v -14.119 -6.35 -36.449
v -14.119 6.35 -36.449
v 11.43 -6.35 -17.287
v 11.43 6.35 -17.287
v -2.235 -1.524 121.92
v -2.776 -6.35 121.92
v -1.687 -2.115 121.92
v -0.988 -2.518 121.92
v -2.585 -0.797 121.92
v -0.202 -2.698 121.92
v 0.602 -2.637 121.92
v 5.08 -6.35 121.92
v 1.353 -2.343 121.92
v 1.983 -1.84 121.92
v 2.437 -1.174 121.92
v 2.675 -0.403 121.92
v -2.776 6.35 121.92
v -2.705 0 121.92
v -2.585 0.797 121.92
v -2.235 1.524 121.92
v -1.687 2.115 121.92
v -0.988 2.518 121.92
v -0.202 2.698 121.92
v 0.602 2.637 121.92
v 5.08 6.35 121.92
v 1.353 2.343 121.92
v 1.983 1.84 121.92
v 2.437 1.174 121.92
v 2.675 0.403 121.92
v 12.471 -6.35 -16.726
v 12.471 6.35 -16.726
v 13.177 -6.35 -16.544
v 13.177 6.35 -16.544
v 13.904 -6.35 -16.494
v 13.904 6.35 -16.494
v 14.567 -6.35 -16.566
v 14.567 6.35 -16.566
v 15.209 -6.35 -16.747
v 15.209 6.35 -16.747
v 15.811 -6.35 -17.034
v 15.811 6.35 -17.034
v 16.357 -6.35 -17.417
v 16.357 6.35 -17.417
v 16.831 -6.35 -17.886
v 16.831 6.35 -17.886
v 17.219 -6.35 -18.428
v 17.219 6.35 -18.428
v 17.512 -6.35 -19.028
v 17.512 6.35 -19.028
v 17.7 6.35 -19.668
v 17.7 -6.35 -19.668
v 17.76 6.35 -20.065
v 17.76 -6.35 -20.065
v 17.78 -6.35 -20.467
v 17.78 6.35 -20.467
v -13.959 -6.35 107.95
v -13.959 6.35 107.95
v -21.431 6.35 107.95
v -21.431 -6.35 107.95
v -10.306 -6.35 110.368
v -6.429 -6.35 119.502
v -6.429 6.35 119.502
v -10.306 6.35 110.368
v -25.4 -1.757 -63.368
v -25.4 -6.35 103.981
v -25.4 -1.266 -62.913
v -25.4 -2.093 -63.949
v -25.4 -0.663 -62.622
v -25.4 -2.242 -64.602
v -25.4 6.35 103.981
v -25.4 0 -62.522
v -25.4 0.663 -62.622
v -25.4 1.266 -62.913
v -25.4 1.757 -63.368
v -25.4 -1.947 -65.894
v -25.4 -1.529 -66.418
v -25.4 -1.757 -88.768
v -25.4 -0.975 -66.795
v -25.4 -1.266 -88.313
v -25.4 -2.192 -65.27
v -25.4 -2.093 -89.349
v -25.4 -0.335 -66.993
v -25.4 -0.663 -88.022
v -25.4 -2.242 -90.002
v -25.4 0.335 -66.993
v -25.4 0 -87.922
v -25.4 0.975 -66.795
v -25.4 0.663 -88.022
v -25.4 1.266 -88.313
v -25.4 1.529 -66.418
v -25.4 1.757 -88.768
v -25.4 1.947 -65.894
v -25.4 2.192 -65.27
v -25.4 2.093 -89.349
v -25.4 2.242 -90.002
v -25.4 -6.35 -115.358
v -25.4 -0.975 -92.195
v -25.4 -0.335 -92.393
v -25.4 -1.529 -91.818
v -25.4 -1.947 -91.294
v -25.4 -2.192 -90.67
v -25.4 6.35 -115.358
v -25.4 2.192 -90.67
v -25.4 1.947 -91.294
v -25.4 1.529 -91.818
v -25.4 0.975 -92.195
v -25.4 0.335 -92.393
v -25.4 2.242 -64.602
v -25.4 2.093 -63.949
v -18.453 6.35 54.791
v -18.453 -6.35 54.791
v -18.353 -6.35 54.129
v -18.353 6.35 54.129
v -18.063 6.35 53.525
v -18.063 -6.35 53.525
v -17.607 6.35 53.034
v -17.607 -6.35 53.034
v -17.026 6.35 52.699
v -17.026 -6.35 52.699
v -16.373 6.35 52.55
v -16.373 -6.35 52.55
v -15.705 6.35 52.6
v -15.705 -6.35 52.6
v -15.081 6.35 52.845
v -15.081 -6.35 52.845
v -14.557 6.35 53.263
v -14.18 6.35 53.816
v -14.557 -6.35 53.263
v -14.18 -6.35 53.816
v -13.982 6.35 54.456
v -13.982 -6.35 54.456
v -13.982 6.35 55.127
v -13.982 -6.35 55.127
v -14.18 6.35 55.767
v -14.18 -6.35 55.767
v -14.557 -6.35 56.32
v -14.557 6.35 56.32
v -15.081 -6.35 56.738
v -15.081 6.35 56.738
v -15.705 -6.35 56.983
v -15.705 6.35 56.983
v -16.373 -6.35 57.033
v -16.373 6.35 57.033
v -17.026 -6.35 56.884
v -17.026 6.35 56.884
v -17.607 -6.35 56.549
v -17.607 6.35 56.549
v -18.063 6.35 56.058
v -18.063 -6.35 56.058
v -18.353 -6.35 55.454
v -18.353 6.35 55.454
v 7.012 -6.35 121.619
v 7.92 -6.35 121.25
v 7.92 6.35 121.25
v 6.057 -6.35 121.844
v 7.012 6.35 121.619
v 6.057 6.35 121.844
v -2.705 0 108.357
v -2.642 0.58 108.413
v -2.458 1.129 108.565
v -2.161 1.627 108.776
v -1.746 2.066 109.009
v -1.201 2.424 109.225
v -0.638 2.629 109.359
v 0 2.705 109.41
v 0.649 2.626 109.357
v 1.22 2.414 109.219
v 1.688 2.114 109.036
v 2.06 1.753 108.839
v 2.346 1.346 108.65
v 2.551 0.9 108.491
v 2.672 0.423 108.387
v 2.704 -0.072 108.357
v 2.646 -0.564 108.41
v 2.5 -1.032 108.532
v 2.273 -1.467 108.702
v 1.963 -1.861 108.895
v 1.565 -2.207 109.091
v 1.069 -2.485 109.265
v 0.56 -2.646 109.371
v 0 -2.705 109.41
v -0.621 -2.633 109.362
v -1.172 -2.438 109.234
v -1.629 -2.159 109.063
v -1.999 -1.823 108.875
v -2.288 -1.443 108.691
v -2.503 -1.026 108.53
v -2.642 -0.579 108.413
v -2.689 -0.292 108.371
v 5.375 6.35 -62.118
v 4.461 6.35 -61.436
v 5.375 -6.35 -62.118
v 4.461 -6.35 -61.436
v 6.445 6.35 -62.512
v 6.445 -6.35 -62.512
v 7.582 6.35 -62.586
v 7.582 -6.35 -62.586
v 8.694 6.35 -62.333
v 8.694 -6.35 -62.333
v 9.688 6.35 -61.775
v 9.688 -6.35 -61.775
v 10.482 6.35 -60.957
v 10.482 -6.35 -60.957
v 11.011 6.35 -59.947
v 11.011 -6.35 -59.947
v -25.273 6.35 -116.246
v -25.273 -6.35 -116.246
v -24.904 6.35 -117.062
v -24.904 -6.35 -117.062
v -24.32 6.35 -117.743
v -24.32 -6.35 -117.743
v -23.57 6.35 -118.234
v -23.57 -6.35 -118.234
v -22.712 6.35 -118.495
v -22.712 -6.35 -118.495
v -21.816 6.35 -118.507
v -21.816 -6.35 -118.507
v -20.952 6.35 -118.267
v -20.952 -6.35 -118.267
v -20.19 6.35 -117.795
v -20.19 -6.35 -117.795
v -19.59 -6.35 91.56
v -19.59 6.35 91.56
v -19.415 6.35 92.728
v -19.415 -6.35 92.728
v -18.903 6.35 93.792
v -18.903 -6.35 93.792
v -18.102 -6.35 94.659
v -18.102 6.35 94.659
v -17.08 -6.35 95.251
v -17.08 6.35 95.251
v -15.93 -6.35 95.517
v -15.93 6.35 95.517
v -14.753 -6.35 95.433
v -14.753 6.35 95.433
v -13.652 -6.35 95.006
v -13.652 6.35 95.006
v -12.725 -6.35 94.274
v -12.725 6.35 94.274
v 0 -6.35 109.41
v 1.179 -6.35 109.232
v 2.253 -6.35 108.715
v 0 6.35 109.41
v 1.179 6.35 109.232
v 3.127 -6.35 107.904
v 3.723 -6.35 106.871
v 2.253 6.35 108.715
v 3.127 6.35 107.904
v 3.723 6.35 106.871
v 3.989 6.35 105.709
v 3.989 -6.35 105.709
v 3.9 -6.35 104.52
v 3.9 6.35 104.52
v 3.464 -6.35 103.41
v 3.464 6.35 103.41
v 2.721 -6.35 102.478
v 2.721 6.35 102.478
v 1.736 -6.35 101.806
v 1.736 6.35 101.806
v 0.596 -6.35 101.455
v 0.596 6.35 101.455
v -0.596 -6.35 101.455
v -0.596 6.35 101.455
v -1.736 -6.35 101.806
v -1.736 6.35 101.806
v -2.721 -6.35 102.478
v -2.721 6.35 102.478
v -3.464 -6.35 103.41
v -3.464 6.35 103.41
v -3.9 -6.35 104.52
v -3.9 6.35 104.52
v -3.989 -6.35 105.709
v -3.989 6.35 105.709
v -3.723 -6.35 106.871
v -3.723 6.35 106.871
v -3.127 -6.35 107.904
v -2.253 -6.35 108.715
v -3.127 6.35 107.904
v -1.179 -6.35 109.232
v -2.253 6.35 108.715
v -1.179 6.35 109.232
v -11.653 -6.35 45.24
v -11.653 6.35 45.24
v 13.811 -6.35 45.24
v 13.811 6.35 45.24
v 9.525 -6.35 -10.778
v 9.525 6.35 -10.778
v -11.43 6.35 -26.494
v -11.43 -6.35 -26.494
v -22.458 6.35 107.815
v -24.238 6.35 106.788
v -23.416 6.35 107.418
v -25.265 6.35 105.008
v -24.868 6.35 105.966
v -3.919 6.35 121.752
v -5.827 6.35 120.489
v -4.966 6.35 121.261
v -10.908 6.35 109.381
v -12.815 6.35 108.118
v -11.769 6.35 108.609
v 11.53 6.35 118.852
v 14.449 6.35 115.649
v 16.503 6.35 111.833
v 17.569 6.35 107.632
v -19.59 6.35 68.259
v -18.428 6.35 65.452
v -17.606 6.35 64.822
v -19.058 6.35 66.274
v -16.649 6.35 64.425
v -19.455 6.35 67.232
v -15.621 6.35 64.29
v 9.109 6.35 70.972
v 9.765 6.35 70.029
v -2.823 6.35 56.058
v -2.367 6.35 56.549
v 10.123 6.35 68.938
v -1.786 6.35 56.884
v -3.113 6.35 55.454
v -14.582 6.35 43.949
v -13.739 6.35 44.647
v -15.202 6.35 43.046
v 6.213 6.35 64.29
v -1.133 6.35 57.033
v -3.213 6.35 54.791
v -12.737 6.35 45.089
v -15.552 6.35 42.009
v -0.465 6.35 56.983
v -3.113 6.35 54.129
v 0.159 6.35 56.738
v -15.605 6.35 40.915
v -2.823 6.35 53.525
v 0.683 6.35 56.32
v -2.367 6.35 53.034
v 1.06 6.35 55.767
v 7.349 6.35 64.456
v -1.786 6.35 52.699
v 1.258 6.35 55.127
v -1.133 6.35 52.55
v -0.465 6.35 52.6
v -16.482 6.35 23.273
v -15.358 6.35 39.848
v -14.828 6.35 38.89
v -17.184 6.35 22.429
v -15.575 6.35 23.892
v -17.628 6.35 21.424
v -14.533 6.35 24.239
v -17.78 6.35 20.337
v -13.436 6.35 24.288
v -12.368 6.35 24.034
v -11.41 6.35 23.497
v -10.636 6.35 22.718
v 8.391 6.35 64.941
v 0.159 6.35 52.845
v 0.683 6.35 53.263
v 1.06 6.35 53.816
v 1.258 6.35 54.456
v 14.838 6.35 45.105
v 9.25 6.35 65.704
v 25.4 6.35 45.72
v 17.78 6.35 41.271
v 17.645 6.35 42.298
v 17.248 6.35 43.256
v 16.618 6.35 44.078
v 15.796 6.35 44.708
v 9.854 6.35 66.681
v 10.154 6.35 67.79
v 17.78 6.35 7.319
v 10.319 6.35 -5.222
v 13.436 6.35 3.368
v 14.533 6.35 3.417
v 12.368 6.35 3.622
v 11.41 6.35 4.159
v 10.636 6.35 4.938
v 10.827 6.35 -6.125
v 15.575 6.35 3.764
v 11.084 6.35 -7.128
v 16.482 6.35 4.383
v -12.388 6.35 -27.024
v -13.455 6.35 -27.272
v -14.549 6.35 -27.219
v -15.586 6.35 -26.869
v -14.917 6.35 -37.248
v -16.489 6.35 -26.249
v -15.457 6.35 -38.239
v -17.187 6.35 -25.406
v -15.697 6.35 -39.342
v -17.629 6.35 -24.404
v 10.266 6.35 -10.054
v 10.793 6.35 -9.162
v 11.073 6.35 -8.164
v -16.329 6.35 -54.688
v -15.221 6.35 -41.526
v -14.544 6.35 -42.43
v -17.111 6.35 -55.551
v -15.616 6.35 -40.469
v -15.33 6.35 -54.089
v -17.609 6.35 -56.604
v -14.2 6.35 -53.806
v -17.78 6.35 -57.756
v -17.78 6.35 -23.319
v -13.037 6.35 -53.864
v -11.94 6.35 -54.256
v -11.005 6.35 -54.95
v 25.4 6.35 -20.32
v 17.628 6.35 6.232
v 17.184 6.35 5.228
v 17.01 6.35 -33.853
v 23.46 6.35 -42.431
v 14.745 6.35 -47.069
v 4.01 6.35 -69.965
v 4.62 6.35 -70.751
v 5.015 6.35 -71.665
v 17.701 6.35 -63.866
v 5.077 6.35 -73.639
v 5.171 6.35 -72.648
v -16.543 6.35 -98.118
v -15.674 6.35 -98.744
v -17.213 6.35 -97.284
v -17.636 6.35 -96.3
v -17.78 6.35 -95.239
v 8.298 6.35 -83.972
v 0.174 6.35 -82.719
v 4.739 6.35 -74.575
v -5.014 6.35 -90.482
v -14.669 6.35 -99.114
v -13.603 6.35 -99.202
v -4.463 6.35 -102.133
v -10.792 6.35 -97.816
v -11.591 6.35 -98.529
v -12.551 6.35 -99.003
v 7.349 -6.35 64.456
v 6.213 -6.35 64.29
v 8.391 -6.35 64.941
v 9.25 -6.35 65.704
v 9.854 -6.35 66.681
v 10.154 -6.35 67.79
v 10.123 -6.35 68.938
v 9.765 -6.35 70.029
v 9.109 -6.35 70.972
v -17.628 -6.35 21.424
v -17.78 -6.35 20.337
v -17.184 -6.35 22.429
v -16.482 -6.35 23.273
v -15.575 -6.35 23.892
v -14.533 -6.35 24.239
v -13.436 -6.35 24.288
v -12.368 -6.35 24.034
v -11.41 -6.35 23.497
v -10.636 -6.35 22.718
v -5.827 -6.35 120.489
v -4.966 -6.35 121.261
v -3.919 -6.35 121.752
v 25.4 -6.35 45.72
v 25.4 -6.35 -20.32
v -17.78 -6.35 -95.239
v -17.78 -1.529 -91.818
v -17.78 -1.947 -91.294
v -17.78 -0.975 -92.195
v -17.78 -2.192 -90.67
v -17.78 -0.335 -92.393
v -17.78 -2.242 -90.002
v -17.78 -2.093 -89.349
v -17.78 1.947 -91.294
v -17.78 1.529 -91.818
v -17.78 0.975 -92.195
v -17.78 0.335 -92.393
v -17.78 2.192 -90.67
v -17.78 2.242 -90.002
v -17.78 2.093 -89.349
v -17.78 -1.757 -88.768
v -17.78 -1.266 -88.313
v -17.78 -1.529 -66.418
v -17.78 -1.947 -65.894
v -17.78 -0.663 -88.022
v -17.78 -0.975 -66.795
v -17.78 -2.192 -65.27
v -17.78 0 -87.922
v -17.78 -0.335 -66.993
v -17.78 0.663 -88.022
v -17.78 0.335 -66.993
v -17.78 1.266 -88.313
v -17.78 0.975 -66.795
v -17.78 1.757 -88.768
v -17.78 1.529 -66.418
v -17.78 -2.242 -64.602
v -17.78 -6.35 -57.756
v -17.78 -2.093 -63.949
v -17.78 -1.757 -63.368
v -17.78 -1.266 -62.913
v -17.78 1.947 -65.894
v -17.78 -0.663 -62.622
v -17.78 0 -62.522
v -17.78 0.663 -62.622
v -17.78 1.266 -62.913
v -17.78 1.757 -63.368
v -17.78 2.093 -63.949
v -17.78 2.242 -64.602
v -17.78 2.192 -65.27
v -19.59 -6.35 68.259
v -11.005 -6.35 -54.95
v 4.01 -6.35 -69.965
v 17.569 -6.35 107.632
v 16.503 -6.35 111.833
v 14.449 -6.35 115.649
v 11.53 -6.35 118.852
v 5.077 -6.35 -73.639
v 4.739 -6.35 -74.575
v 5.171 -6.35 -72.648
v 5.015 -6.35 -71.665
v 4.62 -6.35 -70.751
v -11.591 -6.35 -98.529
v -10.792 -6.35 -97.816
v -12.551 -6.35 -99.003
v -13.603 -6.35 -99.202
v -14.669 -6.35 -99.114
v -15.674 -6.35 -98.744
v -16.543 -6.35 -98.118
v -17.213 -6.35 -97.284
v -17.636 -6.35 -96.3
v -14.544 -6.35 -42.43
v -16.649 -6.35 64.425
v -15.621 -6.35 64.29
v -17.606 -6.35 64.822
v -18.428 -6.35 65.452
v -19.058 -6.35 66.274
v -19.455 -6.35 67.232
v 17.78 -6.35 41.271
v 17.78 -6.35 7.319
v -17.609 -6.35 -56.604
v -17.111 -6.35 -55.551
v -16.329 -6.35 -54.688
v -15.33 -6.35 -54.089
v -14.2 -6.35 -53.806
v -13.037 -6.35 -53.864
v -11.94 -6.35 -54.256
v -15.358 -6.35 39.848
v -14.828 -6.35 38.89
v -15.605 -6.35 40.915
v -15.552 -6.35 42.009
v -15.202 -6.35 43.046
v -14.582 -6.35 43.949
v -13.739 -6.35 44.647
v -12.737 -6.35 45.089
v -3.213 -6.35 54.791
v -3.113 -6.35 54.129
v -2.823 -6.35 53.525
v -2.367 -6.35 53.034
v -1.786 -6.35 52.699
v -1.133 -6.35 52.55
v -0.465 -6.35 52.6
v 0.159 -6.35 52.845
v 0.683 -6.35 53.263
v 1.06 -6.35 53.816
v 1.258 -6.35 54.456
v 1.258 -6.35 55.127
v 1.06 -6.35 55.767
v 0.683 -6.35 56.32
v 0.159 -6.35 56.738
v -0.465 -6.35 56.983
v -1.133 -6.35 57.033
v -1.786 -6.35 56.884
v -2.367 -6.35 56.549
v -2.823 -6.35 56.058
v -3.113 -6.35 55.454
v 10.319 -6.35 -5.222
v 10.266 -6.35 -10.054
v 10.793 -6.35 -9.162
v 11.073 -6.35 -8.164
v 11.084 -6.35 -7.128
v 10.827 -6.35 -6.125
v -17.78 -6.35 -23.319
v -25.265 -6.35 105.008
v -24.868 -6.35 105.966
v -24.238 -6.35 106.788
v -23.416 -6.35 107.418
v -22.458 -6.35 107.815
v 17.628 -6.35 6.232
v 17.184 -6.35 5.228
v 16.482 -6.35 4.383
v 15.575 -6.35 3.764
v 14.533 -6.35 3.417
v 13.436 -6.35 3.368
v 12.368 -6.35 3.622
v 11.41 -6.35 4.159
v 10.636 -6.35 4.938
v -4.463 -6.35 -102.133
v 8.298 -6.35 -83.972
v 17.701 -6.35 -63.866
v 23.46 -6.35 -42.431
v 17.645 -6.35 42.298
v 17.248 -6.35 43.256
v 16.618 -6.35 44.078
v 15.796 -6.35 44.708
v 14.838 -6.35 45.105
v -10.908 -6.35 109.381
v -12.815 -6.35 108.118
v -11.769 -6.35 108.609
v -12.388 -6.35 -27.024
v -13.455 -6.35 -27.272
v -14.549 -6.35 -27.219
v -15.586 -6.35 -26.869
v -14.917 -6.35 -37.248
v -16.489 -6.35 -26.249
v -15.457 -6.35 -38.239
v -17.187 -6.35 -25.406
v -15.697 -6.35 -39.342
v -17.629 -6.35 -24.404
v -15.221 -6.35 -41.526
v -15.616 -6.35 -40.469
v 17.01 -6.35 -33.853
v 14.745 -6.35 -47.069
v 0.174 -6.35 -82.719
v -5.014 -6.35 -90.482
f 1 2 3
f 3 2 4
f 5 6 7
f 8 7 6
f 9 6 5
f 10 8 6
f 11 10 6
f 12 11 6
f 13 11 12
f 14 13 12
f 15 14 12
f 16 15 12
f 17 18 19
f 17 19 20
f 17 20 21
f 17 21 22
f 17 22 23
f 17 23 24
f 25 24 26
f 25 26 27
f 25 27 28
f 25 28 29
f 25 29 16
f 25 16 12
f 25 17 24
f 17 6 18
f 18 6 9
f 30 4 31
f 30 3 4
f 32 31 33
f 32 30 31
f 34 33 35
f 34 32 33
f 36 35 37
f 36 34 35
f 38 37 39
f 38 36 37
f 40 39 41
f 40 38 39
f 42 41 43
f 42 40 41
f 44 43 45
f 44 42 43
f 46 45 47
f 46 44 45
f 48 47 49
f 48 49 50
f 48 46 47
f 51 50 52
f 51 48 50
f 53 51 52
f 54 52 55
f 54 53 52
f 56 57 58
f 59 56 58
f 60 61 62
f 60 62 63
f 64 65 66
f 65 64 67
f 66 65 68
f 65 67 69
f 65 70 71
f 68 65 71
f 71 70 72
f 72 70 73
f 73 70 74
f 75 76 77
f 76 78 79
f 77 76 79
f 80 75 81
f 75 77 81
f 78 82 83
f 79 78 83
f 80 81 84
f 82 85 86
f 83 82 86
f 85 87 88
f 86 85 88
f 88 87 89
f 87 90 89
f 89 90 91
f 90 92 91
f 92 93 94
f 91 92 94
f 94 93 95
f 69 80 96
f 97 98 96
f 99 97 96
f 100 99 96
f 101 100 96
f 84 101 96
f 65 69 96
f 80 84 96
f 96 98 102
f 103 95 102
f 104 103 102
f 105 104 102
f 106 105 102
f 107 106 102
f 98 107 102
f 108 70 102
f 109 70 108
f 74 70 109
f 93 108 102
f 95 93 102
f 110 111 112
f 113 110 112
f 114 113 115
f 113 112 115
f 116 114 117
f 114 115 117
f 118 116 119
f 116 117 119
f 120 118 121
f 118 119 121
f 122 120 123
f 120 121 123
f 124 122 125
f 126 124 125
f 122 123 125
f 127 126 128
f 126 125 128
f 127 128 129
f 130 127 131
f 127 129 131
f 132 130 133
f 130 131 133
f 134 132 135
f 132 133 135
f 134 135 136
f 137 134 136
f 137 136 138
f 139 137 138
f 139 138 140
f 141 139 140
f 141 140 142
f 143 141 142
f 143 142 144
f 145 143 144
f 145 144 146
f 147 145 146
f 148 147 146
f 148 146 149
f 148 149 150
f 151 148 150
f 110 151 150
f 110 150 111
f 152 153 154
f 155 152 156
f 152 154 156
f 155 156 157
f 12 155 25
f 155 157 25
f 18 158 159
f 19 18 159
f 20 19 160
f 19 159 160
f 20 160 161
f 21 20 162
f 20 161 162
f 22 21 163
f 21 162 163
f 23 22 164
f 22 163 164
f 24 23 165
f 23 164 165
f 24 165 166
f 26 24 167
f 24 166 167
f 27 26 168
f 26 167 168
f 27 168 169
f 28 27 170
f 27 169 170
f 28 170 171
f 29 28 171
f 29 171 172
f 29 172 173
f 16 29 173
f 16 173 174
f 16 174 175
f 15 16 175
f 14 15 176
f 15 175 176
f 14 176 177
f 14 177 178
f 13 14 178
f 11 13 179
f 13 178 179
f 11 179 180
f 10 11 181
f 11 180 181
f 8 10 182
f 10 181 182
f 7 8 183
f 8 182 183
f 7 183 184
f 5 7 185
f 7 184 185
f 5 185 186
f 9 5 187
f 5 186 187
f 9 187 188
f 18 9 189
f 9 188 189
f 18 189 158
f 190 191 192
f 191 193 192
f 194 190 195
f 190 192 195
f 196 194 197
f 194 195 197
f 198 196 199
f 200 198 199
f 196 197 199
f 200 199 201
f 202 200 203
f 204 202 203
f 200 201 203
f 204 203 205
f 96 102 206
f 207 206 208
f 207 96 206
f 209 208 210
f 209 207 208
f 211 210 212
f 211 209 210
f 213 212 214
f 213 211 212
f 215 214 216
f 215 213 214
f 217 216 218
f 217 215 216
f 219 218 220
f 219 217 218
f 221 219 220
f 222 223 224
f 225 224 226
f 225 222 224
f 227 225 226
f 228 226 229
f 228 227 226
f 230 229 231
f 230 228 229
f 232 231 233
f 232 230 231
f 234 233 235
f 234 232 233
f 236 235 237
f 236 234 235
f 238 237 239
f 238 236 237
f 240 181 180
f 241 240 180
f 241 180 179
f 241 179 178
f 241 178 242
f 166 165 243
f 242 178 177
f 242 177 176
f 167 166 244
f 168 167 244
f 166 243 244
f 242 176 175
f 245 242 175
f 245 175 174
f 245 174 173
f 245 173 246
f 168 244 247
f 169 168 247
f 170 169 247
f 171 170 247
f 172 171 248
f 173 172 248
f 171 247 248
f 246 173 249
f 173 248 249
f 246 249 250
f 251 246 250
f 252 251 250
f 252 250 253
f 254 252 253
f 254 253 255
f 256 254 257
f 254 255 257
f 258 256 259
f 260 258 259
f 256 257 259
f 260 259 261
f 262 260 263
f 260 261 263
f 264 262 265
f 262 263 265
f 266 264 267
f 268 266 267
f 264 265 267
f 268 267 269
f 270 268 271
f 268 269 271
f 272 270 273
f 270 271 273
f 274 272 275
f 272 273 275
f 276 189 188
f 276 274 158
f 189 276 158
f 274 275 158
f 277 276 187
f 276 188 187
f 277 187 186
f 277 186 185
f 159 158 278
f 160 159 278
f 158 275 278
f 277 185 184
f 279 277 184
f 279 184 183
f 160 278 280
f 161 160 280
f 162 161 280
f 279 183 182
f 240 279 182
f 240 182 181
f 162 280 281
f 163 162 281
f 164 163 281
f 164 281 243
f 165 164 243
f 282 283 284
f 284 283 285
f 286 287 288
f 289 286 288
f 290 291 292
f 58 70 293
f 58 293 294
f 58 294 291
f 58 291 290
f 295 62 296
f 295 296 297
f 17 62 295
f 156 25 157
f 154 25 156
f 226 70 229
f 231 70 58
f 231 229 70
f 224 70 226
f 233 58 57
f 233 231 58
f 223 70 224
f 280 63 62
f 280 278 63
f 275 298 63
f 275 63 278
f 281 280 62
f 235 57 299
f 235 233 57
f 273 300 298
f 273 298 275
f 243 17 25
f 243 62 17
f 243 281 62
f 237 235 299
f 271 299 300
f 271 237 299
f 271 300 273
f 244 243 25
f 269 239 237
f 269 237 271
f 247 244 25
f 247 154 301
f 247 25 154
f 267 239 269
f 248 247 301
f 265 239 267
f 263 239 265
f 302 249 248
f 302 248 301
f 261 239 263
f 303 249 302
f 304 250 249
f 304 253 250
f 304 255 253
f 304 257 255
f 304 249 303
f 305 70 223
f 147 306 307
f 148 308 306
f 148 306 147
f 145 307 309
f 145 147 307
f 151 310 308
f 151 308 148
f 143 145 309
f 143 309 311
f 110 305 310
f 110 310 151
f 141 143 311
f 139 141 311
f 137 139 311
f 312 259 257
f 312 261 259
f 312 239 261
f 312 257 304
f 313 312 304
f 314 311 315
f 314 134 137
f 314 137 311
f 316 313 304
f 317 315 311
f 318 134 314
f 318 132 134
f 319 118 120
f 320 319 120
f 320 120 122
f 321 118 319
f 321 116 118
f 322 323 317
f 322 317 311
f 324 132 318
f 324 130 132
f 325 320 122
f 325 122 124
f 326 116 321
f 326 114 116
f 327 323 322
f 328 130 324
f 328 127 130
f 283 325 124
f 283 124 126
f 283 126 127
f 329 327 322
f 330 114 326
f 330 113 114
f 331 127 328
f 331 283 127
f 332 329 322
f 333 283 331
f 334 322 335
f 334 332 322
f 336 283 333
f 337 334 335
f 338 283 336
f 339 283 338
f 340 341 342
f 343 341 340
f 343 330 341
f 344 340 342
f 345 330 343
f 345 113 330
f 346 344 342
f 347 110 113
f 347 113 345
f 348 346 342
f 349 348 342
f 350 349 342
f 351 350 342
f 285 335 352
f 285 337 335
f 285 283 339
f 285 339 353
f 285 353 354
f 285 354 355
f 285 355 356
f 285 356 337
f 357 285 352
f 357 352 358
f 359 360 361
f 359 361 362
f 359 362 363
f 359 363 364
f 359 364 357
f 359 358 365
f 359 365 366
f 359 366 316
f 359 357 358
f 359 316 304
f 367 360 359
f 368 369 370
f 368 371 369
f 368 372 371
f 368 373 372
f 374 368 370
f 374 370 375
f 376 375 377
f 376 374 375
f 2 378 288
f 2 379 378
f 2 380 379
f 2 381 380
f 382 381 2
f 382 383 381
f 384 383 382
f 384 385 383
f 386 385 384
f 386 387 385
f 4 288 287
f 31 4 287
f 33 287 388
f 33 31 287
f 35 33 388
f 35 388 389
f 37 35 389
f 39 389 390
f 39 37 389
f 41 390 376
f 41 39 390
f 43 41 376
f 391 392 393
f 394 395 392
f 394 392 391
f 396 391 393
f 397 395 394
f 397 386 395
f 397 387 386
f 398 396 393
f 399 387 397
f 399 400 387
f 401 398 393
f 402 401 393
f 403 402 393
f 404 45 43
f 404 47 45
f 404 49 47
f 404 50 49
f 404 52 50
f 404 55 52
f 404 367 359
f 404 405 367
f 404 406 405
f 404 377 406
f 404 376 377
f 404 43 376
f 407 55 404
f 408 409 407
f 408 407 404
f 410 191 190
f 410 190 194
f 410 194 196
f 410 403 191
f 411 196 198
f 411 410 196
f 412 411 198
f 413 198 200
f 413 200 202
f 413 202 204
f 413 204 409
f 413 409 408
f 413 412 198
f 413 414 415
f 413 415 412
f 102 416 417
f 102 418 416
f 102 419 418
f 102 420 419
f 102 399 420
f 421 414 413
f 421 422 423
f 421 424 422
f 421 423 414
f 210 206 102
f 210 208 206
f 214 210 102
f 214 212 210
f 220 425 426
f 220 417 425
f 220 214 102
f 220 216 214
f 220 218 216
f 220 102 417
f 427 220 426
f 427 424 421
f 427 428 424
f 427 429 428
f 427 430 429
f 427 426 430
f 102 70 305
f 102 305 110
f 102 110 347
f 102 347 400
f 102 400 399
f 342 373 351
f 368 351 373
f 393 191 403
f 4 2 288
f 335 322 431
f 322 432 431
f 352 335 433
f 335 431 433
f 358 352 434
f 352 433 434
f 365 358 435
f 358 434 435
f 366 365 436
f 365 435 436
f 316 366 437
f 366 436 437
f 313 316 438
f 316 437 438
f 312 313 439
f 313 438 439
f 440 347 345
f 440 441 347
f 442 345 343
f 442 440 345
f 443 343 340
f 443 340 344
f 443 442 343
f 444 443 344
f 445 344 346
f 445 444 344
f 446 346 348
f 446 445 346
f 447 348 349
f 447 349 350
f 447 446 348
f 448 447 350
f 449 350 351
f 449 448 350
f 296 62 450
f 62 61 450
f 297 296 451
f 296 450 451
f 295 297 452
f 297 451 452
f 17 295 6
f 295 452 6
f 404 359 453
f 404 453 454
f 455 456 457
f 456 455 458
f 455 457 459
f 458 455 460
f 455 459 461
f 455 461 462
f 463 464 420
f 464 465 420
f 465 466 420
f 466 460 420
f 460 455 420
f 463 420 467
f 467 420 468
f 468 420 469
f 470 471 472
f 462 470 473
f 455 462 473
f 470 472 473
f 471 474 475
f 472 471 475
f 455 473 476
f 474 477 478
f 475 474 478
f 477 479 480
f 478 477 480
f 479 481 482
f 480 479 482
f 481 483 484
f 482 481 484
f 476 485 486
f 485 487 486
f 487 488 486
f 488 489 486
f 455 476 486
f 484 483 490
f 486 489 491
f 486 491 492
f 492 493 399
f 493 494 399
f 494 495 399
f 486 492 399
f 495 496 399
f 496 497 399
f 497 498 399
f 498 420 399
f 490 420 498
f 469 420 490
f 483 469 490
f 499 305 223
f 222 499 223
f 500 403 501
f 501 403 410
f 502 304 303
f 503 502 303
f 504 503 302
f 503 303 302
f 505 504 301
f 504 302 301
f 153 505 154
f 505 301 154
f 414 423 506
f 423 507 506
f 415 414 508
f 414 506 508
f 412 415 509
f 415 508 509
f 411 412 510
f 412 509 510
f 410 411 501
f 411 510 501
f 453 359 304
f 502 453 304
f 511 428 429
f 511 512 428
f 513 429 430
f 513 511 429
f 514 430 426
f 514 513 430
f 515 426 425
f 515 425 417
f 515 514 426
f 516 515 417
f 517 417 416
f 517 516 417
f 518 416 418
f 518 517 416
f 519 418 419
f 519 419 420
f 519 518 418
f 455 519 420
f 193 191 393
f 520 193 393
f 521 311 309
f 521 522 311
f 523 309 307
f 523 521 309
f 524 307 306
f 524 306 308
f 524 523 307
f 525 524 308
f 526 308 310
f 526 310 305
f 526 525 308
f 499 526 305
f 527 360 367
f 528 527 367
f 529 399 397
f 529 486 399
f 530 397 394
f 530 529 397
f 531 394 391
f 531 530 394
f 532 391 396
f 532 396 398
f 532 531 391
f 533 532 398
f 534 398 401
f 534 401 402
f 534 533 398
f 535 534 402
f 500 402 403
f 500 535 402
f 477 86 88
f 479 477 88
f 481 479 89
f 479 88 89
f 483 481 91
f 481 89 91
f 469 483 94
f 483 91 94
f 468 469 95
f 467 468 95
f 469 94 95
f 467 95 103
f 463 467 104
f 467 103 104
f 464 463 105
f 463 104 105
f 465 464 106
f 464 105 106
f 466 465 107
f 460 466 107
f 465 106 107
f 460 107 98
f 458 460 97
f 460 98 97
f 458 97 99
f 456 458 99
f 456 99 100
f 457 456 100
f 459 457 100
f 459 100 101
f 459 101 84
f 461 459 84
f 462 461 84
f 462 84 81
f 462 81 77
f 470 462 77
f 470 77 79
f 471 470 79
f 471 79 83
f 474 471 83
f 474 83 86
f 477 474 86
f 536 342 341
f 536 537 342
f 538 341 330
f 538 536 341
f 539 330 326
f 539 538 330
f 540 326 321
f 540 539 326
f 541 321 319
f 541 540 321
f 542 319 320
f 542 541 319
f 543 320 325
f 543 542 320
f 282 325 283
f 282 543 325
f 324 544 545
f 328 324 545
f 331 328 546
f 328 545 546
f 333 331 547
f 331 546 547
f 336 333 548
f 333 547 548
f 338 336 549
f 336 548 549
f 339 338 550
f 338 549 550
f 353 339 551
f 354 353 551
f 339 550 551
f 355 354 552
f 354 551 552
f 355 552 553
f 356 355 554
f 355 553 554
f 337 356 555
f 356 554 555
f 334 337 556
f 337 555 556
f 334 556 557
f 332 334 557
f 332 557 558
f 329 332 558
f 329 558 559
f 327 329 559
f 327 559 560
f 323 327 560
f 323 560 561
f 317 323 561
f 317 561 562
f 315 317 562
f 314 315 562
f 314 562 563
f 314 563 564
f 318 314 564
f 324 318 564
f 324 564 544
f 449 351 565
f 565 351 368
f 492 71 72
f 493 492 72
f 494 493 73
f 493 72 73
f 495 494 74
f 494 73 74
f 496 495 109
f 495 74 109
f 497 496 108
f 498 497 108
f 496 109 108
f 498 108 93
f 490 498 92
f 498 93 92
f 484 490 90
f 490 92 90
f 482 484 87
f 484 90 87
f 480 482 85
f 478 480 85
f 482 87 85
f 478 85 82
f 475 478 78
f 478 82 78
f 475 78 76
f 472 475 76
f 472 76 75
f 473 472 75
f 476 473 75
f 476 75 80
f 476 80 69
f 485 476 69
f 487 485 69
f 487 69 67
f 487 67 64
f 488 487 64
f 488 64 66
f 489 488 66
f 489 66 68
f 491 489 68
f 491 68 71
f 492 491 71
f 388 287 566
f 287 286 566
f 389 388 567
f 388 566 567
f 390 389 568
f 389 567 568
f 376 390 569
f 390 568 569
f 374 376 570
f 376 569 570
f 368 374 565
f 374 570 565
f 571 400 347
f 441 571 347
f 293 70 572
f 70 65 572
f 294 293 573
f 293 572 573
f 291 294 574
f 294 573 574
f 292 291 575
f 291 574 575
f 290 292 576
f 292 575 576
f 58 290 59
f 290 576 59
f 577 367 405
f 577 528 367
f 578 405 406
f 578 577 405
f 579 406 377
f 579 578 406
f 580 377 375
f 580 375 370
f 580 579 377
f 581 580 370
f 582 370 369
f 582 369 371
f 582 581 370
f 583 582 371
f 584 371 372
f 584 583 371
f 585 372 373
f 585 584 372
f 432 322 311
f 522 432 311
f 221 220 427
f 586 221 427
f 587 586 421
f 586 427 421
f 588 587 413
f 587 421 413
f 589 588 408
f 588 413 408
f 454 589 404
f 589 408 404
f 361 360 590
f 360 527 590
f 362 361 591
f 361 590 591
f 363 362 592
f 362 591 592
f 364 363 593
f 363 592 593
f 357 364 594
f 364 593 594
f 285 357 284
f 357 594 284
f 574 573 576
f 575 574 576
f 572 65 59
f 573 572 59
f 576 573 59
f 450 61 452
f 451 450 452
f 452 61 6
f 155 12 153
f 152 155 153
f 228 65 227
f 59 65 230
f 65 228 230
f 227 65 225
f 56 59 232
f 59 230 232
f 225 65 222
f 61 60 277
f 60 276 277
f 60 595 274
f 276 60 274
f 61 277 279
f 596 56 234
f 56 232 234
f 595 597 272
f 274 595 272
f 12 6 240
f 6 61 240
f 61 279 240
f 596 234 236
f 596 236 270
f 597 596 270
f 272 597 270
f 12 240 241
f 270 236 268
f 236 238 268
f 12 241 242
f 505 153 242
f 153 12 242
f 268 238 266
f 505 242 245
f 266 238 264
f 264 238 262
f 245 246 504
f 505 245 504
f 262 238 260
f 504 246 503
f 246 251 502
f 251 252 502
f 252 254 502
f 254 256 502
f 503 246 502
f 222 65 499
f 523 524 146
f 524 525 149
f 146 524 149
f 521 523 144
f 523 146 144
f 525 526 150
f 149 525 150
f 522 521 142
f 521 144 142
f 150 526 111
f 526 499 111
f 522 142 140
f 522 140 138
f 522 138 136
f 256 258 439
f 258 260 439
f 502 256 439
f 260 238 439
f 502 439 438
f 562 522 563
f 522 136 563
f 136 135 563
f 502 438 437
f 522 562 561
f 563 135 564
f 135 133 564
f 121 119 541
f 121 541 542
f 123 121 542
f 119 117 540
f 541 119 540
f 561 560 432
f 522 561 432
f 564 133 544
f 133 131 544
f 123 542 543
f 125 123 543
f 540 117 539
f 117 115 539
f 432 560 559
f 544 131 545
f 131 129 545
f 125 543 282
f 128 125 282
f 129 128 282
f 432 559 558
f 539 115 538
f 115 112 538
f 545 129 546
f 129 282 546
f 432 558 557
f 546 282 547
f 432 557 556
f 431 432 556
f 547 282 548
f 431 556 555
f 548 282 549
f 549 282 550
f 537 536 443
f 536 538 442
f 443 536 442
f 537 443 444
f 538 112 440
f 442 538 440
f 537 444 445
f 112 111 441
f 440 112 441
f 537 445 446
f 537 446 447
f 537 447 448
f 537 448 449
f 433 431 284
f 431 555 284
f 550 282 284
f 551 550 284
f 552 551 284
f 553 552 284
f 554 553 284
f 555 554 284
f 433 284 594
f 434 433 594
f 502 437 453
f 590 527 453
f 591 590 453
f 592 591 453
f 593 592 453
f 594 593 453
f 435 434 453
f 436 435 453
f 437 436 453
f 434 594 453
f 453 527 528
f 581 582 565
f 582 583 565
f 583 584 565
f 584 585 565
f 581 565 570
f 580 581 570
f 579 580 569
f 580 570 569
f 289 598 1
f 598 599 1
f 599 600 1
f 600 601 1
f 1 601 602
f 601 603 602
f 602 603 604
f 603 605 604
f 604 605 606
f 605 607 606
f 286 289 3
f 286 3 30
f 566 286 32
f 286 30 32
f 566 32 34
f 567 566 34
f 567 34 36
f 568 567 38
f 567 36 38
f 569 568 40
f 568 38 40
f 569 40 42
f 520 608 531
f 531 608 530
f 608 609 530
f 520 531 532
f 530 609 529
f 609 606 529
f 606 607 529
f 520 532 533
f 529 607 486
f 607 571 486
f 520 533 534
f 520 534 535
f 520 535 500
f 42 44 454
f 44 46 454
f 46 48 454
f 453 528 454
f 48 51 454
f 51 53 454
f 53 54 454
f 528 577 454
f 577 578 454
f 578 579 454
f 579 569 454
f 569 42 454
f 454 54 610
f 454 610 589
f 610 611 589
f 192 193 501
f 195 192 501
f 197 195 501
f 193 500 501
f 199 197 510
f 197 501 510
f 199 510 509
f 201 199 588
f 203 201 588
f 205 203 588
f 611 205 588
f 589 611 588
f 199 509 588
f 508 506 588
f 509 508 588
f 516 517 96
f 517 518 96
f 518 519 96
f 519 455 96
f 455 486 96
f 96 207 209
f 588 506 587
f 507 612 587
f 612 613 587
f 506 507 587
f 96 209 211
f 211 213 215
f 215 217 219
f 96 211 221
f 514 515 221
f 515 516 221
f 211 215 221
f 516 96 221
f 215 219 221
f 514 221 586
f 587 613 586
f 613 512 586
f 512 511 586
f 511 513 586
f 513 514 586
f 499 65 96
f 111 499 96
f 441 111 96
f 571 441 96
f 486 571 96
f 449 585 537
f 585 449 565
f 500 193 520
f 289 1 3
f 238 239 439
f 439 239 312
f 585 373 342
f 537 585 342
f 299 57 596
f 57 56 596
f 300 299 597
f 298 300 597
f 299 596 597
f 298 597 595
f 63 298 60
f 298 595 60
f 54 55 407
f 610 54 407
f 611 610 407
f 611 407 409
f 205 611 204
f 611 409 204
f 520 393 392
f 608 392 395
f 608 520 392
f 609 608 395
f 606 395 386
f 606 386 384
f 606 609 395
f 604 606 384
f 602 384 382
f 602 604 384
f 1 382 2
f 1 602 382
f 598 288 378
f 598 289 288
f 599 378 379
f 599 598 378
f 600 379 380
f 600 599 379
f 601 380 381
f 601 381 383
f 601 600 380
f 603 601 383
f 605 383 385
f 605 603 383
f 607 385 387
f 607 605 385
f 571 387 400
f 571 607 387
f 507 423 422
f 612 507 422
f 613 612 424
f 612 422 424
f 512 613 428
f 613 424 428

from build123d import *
from OCP.BRepFilletAPI import BRepFilletAPI_MakeFillet

# Parameters (mm, degrees)
SKETCH1_W                      = 50.8
SKETCH1_H                      = 243.84
BOSS_EXTRUDE1_DEPTH            = 6.35
SKETCH2_R                      = 4
PIVOT_POINT_DEPTH              = 126.183610748
MAIN_SHAPE_DEPTH               = 126.183610748
OPTIMIZING_WEIGHT_CUTOUT_DEPTH = 126.183610748
F_8_CLEARANCE_HOLE1_REACH      = 134.233
F_8_CLEARANCE_HOLE1_BORE_R     = 2.2479
F_1_4_28_TAPPED_HOLE1_D        = 5.4102
F_1_4_28_TAPPED_HOLE1_DEPTH    = 13.97
F_1_4_28_TAPPED_HOLE1_TIP      = 1.625388061
FILLET1_R1                     = 3.96875
FILLET1_R2                     = 3.175
F_8_CLEARANCE_HOLE2_D          = 4.4958


with BuildPart() as part:
    # Sketch1 → Boss-Extrude1 (new, symmetric)
    with BuildSketch(Plane(origin=(0, 0, 0), x_dir=(1, 0, 0), z_dir=(0, 1, 0))):
        Rectangle(SKETCH1_W, SKETCH1_H)
    extrude(amount=BOSS_EXTRUDE1_DEPTH, both=True)

    # Sketch2 → Pivot Point (cut, through all)
    with BuildSketch(Plane(origin=(0, 6.35, 0), x_dir=(1, 0, 0), z_dir=(0, 1, 0))):
        with Locations(Location((0, -105.41, 0), (0, 0, 270))):
            Circle(SKETCH2_R)
    extrude(amount=-PIVOT_POINT_DEPTH, mode=Mode.SUBTRACT)

    # Sketch3 → Main Shape (cut, through all)
    with BuildSketch(Plane(origin=(0, 6.35, 0), x_dir=(1, 0, 0), z_dir=(0, 1, 0))):
        Polygon((-11.332366666, -107.95), (-25.4, -107.95), (-25.4, -121.92), (-5.402453483, -121.92), align=None)
        with BuildLine():
            Line((25.4, 121.92), (-25.4, 121.92))
            ThreePointArc((-25.4, 121.92), (11.992253257, 77.116126628), (25.4, 20.32))
            Line((25.4, 20.32), (25.4, 121.92))
        make_face()
        with BuildLine():
            Line((25.4, -121.92), (25.4, -45.72))
            Line((25.4, -45.72), (17.569250135, -107.632186158))
            ThreePointArc((17.569250135, -107.632186158), (14.449275969, -115.648900605), (7.919806331, -121.249612663))
            ThreePointArc((7.919806331, -121.249612663), (6.538931045, -121.750131083), (5.08, -121.92))
            Line((5.08, -121.92), (25.4, -121.92))
        make_face()
    extrude(amount=-MAIN_SHAPE_DEPTH, mode=Mode.SUBTRACT)

    # Sketch4 → Optimizing Weight Cutout (cut, through all)
    with BuildSketch(Plane(origin=(0, 6.35, 0), x_dir=(1, 0, 0), z_dir=(0, 1, 0))):
        with BuildLine():
            ThreePointArc((6.024131859, 71.978790555), (-4.436732062, 89.680534626), (-17.78, 105.324658696))
            Line((-17.78, 105.324658696), (-17.78, 48.174658696))
            Line((-17.78, 48.174658696), (6.024131859, 71.978790555))
        make_face()
        with BuildLine():
            Line((8.791407169, 65.765809744), (-17.78, 39.194402575))
            Line((-17.78, 39.194402575), (17.78, 12.524402575))
            Line((17.78, 12.524402575), (17.78, 20.32))
            ThreePointArc((17.78, 20.32), (15.511294476, 43.483097938), (8.791407169, 65.765809744))
        make_face()
        Polygon((12.7, 8.396902575), (-17.78, 31.256902575), (-17.78, -32.243097425), align=None)
        Polygon((17.78, -45.240017282), (17.78, 4.586902575), (-19.590189893, -45.240017282), align=None)
        Polygon((15.370526289, -64.290017282), (-19.590189893, -64.290017282), (-19.590189893, -101.6), align=None)
    extrude(amount=-OPTIMIZING_WEIGHT_CUTOUT_DEPTH, mode=Mode.SUBTRACT)

    # #8 Clearance Hole1 bore → #8 Clearance Hole1 (cut, up to next)
    with BuildSketch(Plane.ZY.offset(25.4), mode=Mode.PRIVATE) as f_8_clearance_hole1_sk1:
        with Locations((-90.17, 0)):
            Circle(F_8_CLEARANCE_HOLE1_BORE_R)
    f_8_clearance_hole1_tool1 = extrude(f_8_clearance_hole1_sk1.sketch, amount=-F_8_CLEARANCE_HOLE1_REACH, mode=Mode.PRIVATE) & part.part
    # #8 Clearance Hole1 bore → #8 Clearance Hole1 (cut, up to next)
    with BuildSketch(Plane.ZY.offset(25.4), mode=Mode.PRIVATE) as f_8_clearance_hole1_sk2:
        with Locations((-64.77, 0)):
            Circle(F_8_CLEARANCE_HOLE1_BORE_R)
    f_8_clearance_hole1_tool2 = extrude(f_8_clearance_hole1_sk2.sketch, amount=-F_8_CLEARANCE_HOLE1_REACH, mode=Mode.PRIVATE) & part.part
    add(f_8_clearance_hole1_tool1.solids().sort_by_distance((-25.4, 0, -90.17))[0], mode=Mode.SUBTRACT)
    add(f_8_clearance_hole1_tool2.solids().sort_by_distance((-25.4, 0, -64.77))[0], mode=Mode.SUBTRACT)

    # 1/4-28 Tapped Hole1
    with Locations(Plane.XY.offset(121.92)):
        with Locations((0, 0)):
            Hole(F_1_4_28_TAPPED_HOLE1_D / 2, depth=F_1_4_28_TAPPED_HOLE1_DEPTH)
            with Locations((0, 0, -(F_1_4_28_TAPPED_HOLE1_DEPTH + F_1_4_28_TAPPED_HOLE1_TIP / 2))):  # 118° drill point
                Cone(0, F_1_4_28_TAPPED_HOLE1_D / 2, F_1_4_28_TAPPED_HOLE1_TIP, mode=Mode.SUBTRACT)

    # Fillet1: one fillet with a radius per group of edges: ONE call of the kernel's fillet builder (fillet() takes one radius for all edges)
    fillet1_edges_1 = [part.edges().sort_by_distance(p)[0] for p in [
        (-17.78, 0, -39.194402575),
        (17.78, 0, -12.524402575),
        (-17.78, 0, -31.256902575),
        (8.791407169, 0, -65.765809744),
        (6.024131859, 0, -71.978790555),
        (-17.78, 0, -48.174658696),
        (-17.78, 0, -105.324658696),
        (-5.402453483, 0, 121.92),
        (-25.4, 0, 107.95),
        (-11.332366666, 0, 107.95),
        (-17.78, 0, 32.243097425),
        (12.7, 0, -8.396902575),
        (-19.590189893, 0, 45.240017282),
        (17.78, 0, -4.586902575),
        (17.78, 0, 45.240017282),
        (-19.590189893, 0, 101.6),
        (-19.590189893, 0, 64.290017282),
        (15.370526289, 0, 64.290017282),
    ]]
    fillet1_edges_2 = [part.edges().sort_by_distance(p)[0] for p in [
        (-25.4, 0, -121.92),
    ]]
    fillet1 = BRepFilletAPI_MakeFillet(part.part.solid().wrapped)
    for e in fillet1_edges_1:
        fillet1.Add(FILLET1_R1, e.wrapped)
    for e in fillet1_edges_2:
        fillet1.Add(FILLET1_R2, e.wrapped)
    add(Compound.cast(fillet1.Shape()), mode=Mode.REPLACE)

    # #8 Clearance Hole2 (through all)
    with Locations(Plane(origin=(0, 6.35, 0), x_dir=(1, 0, 0), z_dir=(0, 1, 0))):
        with Locations((-16.2052, -54.79148033), (-0.9652, -54.79148033)):
            Hole(F_8_CLEARANCE_HOLE2_D / 2)


solid = part.part
